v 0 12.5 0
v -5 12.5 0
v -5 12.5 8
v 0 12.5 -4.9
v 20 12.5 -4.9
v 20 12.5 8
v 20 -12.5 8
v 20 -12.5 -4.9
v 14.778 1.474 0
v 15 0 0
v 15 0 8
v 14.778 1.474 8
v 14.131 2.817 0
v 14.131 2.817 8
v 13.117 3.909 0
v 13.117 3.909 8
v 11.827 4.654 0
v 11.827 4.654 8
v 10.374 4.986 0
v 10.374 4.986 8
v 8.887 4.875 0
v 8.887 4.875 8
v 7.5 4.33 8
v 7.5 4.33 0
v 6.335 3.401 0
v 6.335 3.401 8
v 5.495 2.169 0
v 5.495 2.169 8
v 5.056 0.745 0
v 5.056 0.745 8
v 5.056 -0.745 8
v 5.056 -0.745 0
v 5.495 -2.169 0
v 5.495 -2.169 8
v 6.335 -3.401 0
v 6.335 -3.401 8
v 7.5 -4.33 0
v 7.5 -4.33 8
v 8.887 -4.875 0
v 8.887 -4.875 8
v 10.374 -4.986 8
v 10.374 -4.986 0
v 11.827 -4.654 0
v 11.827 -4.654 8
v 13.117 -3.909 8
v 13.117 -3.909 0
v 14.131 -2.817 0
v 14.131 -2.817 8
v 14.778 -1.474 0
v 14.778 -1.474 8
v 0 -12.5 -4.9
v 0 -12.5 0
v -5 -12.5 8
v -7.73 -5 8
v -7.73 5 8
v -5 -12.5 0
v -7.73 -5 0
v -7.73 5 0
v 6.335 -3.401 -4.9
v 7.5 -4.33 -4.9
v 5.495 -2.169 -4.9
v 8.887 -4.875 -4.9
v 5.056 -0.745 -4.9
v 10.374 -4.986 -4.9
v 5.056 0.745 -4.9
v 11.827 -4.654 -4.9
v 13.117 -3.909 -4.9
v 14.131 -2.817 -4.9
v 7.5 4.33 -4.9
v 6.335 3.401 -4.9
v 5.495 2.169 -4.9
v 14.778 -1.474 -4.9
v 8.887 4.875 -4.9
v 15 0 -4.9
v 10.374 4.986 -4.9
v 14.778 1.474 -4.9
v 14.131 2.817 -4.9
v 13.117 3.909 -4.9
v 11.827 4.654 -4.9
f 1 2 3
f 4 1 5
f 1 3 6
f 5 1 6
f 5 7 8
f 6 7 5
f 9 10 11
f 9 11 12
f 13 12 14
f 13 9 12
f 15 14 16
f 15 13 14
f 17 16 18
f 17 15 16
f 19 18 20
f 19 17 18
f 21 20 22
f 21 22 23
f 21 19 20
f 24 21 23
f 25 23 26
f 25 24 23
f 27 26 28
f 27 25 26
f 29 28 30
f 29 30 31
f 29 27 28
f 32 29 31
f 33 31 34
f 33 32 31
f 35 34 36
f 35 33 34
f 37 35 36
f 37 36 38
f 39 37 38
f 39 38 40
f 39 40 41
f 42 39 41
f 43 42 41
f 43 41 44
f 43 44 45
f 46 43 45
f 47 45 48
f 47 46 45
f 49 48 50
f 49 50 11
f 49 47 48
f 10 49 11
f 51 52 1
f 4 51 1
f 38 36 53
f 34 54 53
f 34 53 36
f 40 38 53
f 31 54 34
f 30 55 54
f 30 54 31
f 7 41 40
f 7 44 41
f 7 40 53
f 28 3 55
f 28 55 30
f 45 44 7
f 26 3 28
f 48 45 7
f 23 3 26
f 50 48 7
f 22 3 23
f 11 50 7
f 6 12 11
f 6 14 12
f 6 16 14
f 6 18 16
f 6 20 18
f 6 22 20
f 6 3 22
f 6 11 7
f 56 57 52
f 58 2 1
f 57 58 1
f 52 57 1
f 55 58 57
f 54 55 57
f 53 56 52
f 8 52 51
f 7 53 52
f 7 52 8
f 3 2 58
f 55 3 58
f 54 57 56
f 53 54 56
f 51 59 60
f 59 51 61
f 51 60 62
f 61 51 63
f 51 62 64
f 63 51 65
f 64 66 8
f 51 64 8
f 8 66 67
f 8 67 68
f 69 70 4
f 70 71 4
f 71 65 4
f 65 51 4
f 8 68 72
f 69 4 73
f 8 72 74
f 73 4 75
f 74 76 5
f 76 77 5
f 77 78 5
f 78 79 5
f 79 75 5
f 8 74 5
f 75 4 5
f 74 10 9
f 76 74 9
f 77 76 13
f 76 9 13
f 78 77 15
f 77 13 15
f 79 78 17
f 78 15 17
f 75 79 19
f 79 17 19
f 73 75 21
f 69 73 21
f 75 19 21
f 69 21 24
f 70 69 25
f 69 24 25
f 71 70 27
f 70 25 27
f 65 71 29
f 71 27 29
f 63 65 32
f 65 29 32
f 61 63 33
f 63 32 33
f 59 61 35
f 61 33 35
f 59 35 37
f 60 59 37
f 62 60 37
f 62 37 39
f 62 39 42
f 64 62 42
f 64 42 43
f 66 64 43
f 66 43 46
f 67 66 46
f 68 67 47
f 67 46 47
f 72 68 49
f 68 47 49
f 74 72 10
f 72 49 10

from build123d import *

# Parameters (mm, degrees)
F0_R     = 5
F1_DEPTH = 8
F2_W     = 20
F2_H     = 25
F2_R     = 5
F3_DEPTH = 4.9


with BuildPart() as f1:
    # F0 (on Top) → F1 (new body)
    with BuildSketch(Plane.XY):
        Polygon((-5, -12.5), (20, -12.5), (20, 12.5), (-5, 12.5), (-7.729777, 5), (-7.729777, -5), align=None)
        with Locations((10, 0)):
            Circle(F0_R, mode=Mode.SUBTRACT)
    extrude(amount=F1_DEPTH)

    # F2 (on Top) → F3 (join)
    with BuildSketch(Plane.XY):
        with Locations((10, 0)):
            Rectangle(F2_W, F2_H)
        with Locations((10, 0)):
            Circle(F2_R, mode=Mode.SUBTRACT)
    extrude(amount=-F3_DEPTH)


solid = f1.part
